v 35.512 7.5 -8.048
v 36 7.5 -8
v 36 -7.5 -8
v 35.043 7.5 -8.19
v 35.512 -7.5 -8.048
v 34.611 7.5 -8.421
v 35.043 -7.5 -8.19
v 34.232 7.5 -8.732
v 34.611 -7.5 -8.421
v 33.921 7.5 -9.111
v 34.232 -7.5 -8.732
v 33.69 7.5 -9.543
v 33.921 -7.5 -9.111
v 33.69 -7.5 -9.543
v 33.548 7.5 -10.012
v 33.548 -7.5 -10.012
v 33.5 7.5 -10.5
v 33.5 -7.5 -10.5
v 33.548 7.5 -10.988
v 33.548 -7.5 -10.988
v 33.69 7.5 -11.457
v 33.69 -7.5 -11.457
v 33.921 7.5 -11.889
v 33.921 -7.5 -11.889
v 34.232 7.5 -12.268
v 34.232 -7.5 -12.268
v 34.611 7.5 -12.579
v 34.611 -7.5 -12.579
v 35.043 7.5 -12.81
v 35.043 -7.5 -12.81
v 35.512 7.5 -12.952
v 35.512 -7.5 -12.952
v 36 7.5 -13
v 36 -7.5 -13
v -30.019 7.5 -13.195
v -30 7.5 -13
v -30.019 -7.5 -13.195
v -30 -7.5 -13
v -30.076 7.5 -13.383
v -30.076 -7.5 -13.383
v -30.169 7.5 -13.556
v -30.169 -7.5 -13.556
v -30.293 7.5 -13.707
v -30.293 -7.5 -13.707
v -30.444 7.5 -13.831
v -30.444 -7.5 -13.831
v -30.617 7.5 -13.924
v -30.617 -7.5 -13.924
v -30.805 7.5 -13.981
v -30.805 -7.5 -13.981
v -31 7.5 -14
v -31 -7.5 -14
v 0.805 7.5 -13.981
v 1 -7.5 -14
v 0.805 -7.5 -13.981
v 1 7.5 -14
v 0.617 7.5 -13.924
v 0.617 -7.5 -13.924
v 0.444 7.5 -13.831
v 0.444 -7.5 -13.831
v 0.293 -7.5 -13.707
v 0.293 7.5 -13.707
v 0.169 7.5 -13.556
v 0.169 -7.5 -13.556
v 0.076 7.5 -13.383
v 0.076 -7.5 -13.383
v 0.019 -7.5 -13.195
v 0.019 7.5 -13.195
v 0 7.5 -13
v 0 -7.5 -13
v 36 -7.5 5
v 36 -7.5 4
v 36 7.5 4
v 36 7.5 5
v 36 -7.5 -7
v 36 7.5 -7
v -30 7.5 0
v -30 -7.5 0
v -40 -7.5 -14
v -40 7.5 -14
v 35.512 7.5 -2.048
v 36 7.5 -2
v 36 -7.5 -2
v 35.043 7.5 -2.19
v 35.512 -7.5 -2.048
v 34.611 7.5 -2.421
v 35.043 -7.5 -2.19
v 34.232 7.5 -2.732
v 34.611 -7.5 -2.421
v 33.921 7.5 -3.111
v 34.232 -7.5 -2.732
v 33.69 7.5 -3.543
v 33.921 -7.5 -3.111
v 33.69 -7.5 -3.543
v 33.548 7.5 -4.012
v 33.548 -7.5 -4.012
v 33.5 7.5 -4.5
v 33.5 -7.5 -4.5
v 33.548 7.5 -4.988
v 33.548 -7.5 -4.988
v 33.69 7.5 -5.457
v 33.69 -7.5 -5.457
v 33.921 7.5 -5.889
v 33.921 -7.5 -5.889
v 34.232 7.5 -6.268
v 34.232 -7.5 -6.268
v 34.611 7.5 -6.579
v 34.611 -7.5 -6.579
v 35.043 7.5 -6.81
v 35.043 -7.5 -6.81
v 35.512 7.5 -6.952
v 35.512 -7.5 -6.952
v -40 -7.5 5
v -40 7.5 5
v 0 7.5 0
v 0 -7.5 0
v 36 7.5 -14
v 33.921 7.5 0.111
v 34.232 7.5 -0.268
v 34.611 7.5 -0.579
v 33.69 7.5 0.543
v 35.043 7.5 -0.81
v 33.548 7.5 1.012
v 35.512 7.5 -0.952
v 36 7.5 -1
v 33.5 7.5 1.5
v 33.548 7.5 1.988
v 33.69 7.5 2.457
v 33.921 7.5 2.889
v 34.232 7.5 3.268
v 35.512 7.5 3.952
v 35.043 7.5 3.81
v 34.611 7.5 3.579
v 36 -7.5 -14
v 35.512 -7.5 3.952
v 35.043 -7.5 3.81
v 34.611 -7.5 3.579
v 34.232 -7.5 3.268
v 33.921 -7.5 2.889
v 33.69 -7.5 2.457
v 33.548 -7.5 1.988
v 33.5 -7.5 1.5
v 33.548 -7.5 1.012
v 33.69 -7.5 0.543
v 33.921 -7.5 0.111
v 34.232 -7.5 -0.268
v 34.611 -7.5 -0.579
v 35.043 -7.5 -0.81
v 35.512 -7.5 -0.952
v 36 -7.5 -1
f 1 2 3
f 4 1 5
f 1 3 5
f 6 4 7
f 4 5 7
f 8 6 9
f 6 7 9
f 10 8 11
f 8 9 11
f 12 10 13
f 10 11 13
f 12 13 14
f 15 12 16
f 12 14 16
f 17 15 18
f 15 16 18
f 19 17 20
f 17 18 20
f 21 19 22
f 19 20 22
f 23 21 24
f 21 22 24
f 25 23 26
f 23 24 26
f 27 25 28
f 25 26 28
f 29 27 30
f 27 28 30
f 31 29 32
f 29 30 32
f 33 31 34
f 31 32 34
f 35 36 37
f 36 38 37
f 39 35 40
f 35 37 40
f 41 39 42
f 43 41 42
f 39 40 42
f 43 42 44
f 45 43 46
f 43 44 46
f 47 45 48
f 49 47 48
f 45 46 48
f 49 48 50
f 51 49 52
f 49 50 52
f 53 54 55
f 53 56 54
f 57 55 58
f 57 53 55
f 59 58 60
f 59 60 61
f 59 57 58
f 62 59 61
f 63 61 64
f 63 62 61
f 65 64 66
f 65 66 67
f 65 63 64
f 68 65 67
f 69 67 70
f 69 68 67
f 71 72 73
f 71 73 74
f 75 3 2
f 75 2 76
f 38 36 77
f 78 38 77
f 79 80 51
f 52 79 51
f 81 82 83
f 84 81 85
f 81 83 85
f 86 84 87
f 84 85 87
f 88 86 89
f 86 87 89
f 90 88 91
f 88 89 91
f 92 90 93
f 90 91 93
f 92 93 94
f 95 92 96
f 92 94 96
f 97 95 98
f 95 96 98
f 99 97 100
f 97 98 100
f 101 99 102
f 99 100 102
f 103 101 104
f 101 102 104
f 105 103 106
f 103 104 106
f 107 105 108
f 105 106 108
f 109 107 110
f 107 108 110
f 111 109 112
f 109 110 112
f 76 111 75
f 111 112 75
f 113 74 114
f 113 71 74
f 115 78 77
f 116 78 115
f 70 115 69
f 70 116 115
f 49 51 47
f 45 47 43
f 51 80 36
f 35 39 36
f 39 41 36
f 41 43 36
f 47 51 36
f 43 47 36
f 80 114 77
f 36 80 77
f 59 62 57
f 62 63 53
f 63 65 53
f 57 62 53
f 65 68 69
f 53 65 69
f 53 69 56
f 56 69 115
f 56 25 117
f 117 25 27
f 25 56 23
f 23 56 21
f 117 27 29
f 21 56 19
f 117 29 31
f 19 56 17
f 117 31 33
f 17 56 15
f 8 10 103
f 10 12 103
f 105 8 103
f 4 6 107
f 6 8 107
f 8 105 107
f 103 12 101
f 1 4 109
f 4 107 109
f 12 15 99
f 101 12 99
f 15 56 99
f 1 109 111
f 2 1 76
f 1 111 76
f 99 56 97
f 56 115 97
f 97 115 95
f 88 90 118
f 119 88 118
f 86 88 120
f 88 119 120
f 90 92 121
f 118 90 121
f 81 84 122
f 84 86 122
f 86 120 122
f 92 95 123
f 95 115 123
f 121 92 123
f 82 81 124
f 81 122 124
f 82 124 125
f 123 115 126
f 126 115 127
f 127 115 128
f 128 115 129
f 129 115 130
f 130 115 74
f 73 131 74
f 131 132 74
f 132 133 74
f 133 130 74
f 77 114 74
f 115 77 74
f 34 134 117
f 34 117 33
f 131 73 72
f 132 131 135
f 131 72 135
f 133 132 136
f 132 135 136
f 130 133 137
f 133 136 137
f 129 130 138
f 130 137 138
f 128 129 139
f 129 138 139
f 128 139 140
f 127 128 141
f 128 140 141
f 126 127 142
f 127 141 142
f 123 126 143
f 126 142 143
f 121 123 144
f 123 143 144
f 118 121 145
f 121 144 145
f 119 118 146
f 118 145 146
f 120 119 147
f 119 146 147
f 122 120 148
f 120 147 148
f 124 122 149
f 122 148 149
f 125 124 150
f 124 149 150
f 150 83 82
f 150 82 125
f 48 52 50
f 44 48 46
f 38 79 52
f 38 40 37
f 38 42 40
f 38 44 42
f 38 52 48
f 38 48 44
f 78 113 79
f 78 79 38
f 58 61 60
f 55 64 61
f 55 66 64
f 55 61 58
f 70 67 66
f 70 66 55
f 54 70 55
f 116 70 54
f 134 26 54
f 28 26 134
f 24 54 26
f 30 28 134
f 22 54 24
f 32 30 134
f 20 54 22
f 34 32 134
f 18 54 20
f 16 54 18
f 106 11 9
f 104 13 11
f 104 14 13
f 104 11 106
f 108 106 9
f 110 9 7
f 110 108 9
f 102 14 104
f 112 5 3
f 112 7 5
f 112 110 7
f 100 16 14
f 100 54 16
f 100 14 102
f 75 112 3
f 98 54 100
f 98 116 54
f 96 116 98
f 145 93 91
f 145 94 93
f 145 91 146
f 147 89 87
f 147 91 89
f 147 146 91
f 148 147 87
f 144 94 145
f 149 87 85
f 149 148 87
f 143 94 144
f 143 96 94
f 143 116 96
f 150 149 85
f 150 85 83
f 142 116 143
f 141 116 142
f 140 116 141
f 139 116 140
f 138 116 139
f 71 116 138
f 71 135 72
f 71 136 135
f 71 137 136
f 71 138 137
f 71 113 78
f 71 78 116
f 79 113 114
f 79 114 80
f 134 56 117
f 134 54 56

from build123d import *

# Parameters (mm, degrees)
F1_DEPTH      = 7.5
F1_DEPTH_BACK = 7.5
F2_R          = 2.5
F3_DEPTH      = 15.001
F4_R          = 1


with BuildPart() as f1:
    # F0 (on Front) → F1 (new body, two sides)
    with BuildSketch(Plane.XZ) as f1_sk:
        Polygon((36, 5), (-40, 5), (-40, -14), (-30, -14), (-30, 0), (0, 0), (0, -14), (36, -14), align=None)
    extrude(amount=F1_DEPTH)
    extrude(f1_sk.sketch, amount=-F1_DEPTH_BACK)

    # F2 (on face) → F3 (cut, through all)
    with BuildSketch(Plane.XZ.offset(7.5)):
        with Locations((36, 1.5)):
            Circle(F2_R)
        with Locations((36, -4.5)):
            Circle(F2_R)
        with Locations((36, -10.5)):
            Circle(F2_R)
    extrude(amount=-F3_DEPTH, mode=Mode.SUBTRACT)

    # F4
    f4_edges = [f1.edges().sort_by_distance(p)[0] for p in [
        (-30, 0, -14),
        (0, 0, -14),
    ]]
    fillet(f4_edges, radius=F4_R)


solid = f1.part
